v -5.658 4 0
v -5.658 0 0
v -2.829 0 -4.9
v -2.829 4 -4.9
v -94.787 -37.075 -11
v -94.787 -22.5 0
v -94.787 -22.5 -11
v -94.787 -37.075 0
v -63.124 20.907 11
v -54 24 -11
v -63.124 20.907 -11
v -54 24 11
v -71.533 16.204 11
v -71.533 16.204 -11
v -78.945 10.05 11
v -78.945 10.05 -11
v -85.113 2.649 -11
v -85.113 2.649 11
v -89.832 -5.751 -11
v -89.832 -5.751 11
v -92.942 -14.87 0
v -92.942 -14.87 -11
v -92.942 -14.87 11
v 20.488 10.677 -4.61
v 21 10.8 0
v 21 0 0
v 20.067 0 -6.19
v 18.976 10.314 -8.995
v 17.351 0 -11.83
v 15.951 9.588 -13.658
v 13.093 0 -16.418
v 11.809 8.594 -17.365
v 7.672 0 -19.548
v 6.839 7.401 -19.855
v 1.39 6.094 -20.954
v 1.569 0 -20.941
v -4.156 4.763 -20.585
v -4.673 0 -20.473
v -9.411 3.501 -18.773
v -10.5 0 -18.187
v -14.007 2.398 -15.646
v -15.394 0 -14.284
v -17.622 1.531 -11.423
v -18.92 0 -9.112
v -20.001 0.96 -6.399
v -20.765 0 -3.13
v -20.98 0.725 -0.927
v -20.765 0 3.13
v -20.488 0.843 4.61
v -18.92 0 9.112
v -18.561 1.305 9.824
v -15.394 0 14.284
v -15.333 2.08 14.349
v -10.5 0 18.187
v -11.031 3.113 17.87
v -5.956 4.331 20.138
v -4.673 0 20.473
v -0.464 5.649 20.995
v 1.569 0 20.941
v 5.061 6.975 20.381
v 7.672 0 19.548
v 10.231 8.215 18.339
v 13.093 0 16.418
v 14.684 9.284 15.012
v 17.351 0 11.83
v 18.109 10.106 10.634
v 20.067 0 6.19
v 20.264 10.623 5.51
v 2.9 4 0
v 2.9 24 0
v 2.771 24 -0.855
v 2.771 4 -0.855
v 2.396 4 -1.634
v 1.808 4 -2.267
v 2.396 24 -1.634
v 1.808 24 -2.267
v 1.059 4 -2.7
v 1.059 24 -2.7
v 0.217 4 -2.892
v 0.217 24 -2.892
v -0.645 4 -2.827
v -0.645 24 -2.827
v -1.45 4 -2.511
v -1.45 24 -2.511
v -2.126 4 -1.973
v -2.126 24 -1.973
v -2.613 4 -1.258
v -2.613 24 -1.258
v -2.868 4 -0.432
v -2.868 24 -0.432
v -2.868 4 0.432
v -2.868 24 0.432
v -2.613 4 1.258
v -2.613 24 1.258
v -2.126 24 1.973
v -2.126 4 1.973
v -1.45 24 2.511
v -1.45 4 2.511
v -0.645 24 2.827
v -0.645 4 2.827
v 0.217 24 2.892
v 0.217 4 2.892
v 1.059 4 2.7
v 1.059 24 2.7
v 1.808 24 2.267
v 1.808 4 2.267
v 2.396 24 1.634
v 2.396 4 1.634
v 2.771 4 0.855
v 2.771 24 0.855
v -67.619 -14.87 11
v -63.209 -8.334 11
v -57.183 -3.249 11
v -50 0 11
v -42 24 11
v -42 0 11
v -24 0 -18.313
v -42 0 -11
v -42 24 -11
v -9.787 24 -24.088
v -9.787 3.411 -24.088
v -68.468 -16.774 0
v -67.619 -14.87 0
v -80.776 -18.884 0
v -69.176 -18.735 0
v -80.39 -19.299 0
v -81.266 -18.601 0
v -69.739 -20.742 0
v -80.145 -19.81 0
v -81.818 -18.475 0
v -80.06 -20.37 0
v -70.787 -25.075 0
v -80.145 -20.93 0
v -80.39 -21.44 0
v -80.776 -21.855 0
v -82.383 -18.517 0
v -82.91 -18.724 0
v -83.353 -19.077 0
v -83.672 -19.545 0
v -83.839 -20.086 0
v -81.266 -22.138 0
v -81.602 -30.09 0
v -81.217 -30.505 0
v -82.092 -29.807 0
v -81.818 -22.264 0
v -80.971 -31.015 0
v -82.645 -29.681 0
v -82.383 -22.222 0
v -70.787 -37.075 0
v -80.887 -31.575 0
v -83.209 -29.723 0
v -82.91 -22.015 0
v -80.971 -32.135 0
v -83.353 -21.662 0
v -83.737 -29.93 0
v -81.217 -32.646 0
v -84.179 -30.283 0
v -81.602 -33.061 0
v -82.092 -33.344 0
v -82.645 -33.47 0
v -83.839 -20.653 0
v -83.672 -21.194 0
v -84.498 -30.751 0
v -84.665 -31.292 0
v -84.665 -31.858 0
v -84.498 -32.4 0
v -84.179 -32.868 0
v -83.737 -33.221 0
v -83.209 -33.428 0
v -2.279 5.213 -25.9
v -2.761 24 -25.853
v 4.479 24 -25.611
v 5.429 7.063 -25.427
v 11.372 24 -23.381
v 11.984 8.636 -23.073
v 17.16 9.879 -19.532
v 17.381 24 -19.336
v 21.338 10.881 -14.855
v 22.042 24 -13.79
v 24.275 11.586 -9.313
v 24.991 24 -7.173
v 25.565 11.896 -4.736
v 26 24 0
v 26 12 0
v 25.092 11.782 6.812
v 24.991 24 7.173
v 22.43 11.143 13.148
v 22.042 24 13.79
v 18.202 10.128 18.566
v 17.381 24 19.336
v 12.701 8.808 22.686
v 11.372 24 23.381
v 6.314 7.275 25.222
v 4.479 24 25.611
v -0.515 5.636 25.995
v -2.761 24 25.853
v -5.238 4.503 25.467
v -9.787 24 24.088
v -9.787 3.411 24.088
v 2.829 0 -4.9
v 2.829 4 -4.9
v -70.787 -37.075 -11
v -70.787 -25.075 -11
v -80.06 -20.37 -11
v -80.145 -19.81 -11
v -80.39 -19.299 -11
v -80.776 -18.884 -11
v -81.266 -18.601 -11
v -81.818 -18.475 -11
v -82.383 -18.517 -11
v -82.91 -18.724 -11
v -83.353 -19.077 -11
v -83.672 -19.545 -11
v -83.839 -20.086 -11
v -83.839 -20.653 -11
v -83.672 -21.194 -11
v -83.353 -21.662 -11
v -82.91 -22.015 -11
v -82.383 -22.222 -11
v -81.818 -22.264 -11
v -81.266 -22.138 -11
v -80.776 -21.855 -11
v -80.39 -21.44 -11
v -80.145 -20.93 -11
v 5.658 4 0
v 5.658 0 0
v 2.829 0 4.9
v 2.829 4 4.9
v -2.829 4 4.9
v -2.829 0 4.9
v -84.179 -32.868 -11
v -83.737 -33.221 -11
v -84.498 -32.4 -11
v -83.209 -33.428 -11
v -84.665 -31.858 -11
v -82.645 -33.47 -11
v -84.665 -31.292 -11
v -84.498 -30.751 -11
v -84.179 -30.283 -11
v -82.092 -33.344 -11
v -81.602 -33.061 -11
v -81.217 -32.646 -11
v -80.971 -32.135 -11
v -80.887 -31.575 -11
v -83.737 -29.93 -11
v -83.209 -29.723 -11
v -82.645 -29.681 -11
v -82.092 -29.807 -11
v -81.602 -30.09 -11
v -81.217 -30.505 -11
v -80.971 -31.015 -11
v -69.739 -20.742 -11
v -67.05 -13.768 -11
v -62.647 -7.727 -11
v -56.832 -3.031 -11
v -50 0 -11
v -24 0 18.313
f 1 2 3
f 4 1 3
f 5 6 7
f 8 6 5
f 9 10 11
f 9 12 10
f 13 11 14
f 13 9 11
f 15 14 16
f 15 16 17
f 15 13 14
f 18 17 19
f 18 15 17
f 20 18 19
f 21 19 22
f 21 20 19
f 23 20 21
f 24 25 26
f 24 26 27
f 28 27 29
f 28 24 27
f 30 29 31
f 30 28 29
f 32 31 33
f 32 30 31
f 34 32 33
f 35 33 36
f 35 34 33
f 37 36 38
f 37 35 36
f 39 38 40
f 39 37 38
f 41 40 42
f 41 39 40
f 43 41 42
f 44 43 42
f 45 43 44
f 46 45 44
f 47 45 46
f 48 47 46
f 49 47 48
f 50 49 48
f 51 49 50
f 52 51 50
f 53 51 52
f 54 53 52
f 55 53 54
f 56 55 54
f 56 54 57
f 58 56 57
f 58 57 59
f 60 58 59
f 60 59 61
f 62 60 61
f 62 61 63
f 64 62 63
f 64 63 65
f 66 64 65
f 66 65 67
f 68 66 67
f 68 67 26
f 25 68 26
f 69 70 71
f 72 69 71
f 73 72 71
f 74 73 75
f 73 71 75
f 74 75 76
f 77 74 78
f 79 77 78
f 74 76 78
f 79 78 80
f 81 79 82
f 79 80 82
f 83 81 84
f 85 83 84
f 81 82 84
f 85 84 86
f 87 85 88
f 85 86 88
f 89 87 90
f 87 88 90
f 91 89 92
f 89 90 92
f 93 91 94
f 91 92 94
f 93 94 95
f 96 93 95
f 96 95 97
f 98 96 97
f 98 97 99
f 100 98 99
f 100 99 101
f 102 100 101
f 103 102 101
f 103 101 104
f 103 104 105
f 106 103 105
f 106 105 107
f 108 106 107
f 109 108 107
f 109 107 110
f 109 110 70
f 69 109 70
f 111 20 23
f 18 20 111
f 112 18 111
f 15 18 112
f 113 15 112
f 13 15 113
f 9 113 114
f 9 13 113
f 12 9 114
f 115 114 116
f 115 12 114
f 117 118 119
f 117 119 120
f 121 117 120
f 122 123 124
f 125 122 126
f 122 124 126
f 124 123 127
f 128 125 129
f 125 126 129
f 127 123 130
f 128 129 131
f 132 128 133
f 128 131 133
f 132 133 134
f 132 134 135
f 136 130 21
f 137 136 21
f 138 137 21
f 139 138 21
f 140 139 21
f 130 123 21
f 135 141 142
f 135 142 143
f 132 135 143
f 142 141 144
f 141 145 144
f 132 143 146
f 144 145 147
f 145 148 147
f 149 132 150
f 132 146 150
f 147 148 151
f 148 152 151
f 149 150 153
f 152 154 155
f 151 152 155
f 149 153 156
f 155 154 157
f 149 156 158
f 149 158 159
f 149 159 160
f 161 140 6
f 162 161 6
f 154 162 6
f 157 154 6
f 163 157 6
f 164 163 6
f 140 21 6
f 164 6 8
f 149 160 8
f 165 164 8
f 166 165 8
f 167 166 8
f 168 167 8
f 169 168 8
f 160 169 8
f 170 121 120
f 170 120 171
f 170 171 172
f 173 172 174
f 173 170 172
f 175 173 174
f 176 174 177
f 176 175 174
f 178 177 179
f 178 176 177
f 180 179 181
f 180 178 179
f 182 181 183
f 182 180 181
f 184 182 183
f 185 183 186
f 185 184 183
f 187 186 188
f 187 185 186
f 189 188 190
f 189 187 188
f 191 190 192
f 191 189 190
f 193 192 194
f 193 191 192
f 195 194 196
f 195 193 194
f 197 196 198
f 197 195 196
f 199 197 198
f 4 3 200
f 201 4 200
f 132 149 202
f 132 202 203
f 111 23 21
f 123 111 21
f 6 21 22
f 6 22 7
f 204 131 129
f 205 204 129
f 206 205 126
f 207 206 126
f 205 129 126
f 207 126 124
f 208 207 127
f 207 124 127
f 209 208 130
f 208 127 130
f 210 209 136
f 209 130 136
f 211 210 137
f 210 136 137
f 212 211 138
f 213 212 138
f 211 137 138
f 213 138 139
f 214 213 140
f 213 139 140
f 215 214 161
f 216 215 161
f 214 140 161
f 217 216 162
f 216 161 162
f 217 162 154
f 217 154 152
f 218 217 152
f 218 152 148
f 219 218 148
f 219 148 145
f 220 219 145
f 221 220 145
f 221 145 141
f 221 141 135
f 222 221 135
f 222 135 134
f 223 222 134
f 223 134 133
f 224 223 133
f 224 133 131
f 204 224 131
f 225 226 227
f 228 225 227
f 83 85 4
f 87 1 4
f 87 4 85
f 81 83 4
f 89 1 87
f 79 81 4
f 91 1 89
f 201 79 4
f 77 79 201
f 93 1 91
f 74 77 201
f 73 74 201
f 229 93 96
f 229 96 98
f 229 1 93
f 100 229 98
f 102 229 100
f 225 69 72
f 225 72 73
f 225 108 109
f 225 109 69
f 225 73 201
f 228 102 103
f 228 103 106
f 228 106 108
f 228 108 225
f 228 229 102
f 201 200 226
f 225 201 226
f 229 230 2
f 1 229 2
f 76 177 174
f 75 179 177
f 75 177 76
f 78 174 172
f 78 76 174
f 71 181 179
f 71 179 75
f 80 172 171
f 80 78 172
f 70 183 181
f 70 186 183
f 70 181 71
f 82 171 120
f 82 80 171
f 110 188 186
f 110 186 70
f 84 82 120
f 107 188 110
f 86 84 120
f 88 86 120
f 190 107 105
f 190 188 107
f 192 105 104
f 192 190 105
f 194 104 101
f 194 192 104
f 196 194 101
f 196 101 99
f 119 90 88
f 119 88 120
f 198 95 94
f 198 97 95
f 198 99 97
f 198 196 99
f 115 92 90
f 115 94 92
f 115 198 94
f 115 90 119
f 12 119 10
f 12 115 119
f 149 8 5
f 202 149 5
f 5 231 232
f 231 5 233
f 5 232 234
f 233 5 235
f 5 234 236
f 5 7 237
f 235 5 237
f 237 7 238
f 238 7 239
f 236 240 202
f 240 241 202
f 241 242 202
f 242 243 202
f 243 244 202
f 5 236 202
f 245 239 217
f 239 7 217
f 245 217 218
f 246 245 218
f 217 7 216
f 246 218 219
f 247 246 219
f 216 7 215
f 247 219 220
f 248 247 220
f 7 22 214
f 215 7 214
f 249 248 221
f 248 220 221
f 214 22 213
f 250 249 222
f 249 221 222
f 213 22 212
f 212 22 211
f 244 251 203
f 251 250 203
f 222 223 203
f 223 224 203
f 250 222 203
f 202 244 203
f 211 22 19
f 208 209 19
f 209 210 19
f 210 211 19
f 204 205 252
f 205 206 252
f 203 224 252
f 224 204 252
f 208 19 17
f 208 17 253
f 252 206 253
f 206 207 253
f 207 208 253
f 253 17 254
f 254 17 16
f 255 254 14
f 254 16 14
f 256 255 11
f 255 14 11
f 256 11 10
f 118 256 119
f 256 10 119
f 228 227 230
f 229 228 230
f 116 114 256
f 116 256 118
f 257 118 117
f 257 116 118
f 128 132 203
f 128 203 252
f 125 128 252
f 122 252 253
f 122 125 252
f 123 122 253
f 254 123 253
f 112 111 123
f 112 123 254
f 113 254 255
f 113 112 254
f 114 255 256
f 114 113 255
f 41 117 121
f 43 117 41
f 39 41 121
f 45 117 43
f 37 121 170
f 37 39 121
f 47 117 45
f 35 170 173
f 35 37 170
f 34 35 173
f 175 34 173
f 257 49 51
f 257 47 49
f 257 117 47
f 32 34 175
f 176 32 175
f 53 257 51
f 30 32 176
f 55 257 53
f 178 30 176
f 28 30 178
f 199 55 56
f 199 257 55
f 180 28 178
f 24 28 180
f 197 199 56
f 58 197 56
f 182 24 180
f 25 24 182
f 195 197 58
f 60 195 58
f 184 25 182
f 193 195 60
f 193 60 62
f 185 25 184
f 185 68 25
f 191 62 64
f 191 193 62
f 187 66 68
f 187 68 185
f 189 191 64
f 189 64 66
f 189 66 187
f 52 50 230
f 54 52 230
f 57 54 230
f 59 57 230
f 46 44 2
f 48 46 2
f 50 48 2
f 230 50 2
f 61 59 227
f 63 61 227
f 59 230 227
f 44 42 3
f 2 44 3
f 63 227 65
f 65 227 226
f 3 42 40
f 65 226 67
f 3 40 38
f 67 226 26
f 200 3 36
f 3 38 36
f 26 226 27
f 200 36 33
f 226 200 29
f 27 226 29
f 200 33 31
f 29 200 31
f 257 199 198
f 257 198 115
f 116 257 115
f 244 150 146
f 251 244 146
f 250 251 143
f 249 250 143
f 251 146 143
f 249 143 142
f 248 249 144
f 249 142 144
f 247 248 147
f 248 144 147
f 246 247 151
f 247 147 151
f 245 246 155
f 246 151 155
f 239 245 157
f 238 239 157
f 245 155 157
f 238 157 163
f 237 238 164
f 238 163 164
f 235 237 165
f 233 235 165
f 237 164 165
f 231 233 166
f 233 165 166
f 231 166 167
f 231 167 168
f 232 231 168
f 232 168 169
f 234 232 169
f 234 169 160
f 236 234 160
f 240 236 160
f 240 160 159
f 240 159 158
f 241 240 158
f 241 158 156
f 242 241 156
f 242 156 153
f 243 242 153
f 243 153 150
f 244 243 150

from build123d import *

# Parameters (mm, degrees)
BOSS_EXTRUDE1_DEPTH = 24
CUT_EXTRUDE1_DEPTH  = 29.5
SKETCH3_R           = 21
BOSS_EXTRUDE2_DEPTH = 24
CUT_EXTRUDE2_DEPTH  = 4
BOSS_EXTRUDE3_DEPTH = 11
SKETCH6_W           = 89
SKETCH6_H           = 21.5
SKETCH7_W           = 48
SKETCH7_H           = 22
BOSS_EXTRUDE4_DEPTH = 3.027047
SKETCH8_R           = 18.5
CUT_EXTRUDE3_DEPTH  = 83
CUT_EXTRUDE4_REACH  = 91
SKETCH9_R           = 1.6
SKETCH9_R_2         = 6.1
CUT_EXTRUDE5_REACH  = 125.5
SKETCH10_R          = 2.9
CUT_EXTRUDE6_REACH  = 136
SKETCH13_R          = 1.9
CUT_EXTRUDE7_DEPTH  = 27


with BuildPart() as part:
    # Sketch1 → Boss-Extrude1 (new body)
    with BuildSketch(Plane(origin=(0, 0, 0), x_dir=(1, 0, 0), z_dir=(0, 1, 0))):
        with BuildLine():
            Line((-42, 0), (-42, 11))
            Line((-42, 11), (-9.786517927, 24.087840644))
            ThreePointArc((-9.786517927, 24.087840644), (26, 0), (-9.786517927, -24.087840644))
            Line((-9.786517927, -24.087840644), (-42, -11))
            Line((-42, -11), (-42, 0))
        make_face()
    extrude(amount=BOSS_EXTRUDE1_DEPTH)

    # Sketch2 → Cut-Extrude1 (cut, symmetric)
    with BuildSketch(Plane.XY):
        Polygon((-24, 0), (26, 12), (26, 0), align=None)
    extrude(amount=CUT_EXTRUDE1_DEPTH, both=True, mode=Mode.SUBTRACT)

    # Sketch3 → Boss-Extrude2 (add)
    with BuildSketch(Plane(origin=(0, 24, 0), x_dir=(1, 0, 0), z_dir=(0, 1, 0))):
        Circle(SKETCH3_R)
    extrude(amount=-BOSS_EXTRUDE2_DEPTH)

    # Sketch4 → Cut-Extrude2 (cut)
    with BuildSketch(Plane.XZ):
        Polygon((2.829016319, 4.9), (-2.829016319, 4.9), (-5.658032638, 0), (-2.829016319, -4.9), (2.829016319, -4.9), (5.658032638, 0), align=None)
    extrude(amount=-CUT_EXTRUDE2_DEPTH, mode=Mode.SUBTRACT)

    # Sketch5 → Boss-Extrude3 (add, symmetric)
    with BuildSketch(Plane.XY):
        with BuildLine():
            ThreePointArc((-54, 24), (-78.945219608, 10.049710337), (-92.941825352, -14.869551102))
            Line((-92.941825352, -14.869551102), (-94.786517927, -22.5))
            Line((-94.786517927, -22.5), (-94.786517927, -37.075307894))
            Line((-94.786517927, -37.075307894), (-93.178015205, -46.5))
            Line((-93.178015205, -46.5), (-90, -56.5))
            Line((-90, -56.5), (-42, -56.5))
            Line((-42, -56.5), (-63.178015205, -46.5))
            Line((-63.178015205, -46.5), (-70.786517927, -37.075307894))
            Line((-70.786517927, -37.075307894), (-70.786517927, -25.075307894))
            Line((-70.786517927, -25.075307894), (-69.738862808, -20.741751748))
            ThreePointArc((-69.738862808, -20.741751748), (-62.647337683, -7.727284744), (-50, 0))
            Line((-50, 0), (-42, 0))
            Line((-42, 0), (-42, 24))
            Line((-42, 24), (-54, 24))
        make_face()
    extrude(amount=BOSS_EXTRUDE3_DEPTH, both=True)



with BuildPart() as body_2:
    # Sketch6 → Revolve1 (revolve)
    with BuildSketch(Plane.XY):
        with Locations((-53.5, -88.75)):
            Rectangle(SKETCH6_W, SKETCH6_H)
    revolve(axis=Axis((-98, -78, 0), (1, 0, 0)))


with BuildPart() as part_1:
    add(part.part)

    add(body_2.part)  # Boss-Extrude4 merges body 2
    # Sketch7 → Boss-Extrude4 (add)
    with BuildSketch(Plane.XZ.offset(56.5)):
        with Locations((-66, 0)):
            Rectangle(SKETCH7_W, SKETCH7_H)
    extrude(amount=BOSS_EXTRUDE4_DEPTH)

    # Sketch8 → Cut-Extrude3 (cut)
    with BuildSketch(Plane.ZY.offset(98)):
        with Locations((0, -78)):
            Circle(SKETCH8_R)
    extrude(amount=-CUT_EXTRUDE3_DEPTH, mode=Mode.SUBTRACT)

    # Sketch9 → Cut-Extrude4 (cut, up to next)
    with BuildSketch(Plane(origin=(-9, 0, 0), x_dir=(0, 0, -1), z_dir=(1, 0, 0)), mode=Mode.PRIVATE) as cut_extrude4_sk1:
        with Locations((15.5, -78)):
            Circle(SKETCH9_R)
    cut_extrude4_tool1 = extrude(cut_extrude4_sk1.sketch, amount=-CUT_EXTRUDE4_REACH, mode=Mode.PRIVATE) & part_1.part
    add(cut_extrude4_tool1.solids().sort_by_distance((-9, -78, -15.5))[0], mode=Mode.SUBTRACT)
    # Sketch9 → Cut-Extrude4 (cut, up to next)
    with BuildSketch(Plane(origin=(-9, 0, 0), x_dir=(0, 0, -1), z_dir=(1, 0, 0)), mode=Mode.PRIVATE) as cut_extrude4_sk2:
        with Locations((7.75, -91.423393759)):
            Circle(SKETCH9_R)
    cut_extrude4_tool2 = extrude(cut_extrude4_sk2.sketch, amount=-CUT_EXTRUDE4_REACH, mode=Mode.PRIVATE) & part_1.part
    add(cut_extrude4_tool2.solids().sort_by_distance((-9, -91.423394, -7.75))[0], mode=Mode.SUBTRACT)
    # Sketch9 → Cut-Extrude4 (cut, up to next)
    with BuildSketch(Plane(origin=(-9, 0, 0), x_dir=(0, 0, -1), z_dir=(1, 0, 0)), mode=Mode.PRIVATE) as cut_extrude4_sk3:
        with Locations((-7.75, -91.423393759)):
            Circle(SKETCH9_R)
    cut_extrude4_tool3 = extrude(cut_extrude4_sk3.sketch, amount=-CUT_EXTRUDE4_REACH, mode=Mode.PRIVATE) & part_1.part
    add(cut_extrude4_tool3.solids().sort_by_distance((-9, -91.423394, 7.75))[0], mode=Mode.SUBTRACT)
    # Sketch9 → Cut-Extrude4 (cut, up to next)
    with BuildSketch(Plane(origin=(-9, 0, 0), x_dir=(0, 0, -1), z_dir=(1, 0, 0)), mode=Mode.PRIVATE) as cut_extrude4_sk4:
        with Locations((-15.5, -78)):
            Circle(SKETCH9_R)
    cut_extrude4_tool4 = extrude(cut_extrude4_sk4.sketch, amount=-CUT_EXTRUDE4_REACH, mode=Mode.PRIVATE) & part_1.part
    add(cut_extrude4_tool4.solids().sort_by_distance((-9, -78, 15.5))[0], mode=Mode.SUBTRACT)
    # Sketch9 → Cut-Extrude4 (cut, up to next)
    with BuildSketch(Plane(origin=(-9, 0, 0), x_dir=(0, 0, -1), z_dir=(1, 0, 0)), mode=Mode.PRIVATE) as cut_extrude4_sk5:
        with Locations((-7.75, -64.576606241)):
            Circle(SKETCH9_R)
    cut_extrude4_tool5 = extrude(cut_extrude4_sk5.sketch, amount=-CUT_EXTRUDE4_REACH, mode=Mode.PRIVATE) & part_1.part
    add(cut_extrude4_tool5.solids().sort_by_distance((-9, -64.576606, 7.75))[0], mode=Mode.SUBTRACT)
    # Sketch9 → Cut-Extrude4 (cut, up to next)
    with BuildSketch(Plane(origin=(-9, 0, 0), x_dir=(0, 0, -1), z_dir=(1, 0, 0)), mode=Mode.PRIVATE) as cut_extrude4_sk6:
        with Locations((7.75, -64.576606241)):
            Circle(SKETCH9_R)
    cut_extrude4_tool6 = extrude(cut_extrude4_sk6.sketch, amount=-CUT_EXTRUDE4_REACH, mode=Mode.PRIVATE) & part_1.part
    add(cut_extrude4_tool6.solids().sort_by_distance((-9, -64.576606, -7.75))[0], mode=Mode.SUBTRACT)
    # Sketch9 → Cut-Extrude4 (cut, up to next)
    with BuildSketch(Plane(origin=(-9, 0, 0), x_dir=(0, 0, -1), z_dir=(1, 0, 0)), mode=Mode.PRIVATE) as cut_extrude4_sk7:
        with Locations((0, -85)):
            Circle(SKETCH9_R_2)
    cut_extrude4_tool7 = extrude(cut_extrude4_sk7.sketch, amount=-CUT_EXTRUDE4_REACH, mode=Mode.PRIVATE) & part_1.part
    add(cut_extrude4_tool7.solids().sort_by_distance((-9, -85, 0))[0], mode=Mode.SUBTRACT)

    # Sketch10 → Cut-Extrude5 (cut, up to next)
    with BuildSketch(Plane(origin=(0, 24, 0), x_dir=(1, 0, 0), z_dir=(0, 1, 0)), mode=Mode.PRIVATE) as cut_extrude5_sk1:
        Circle(SKETCH10_R)
    cut_extrude5_tool1 = extrude(cut_extrude5_sk1.sketch, amount=-CUT_EXTRUDE5_REACH, mode=Mode.PRIVATE) & part_1.part
    add(cut_extrude5_tool1.solids().sort_by_distance((0, 24, 0))[0], mode=Mode.SUBTRACT)

    # Sketch12 → Cut-Extrude6 (cut, up to next)
    with BuildSketch(Plane.ZY.offset(108), mode=Mode.PRIVATE) as cut_extrude6_sk1:
        Polygon((0, -14.869551102), (0, -37.075307894), (-35.009935155, -37.075307894), (-35.009935155, -113.334550455), (34.515095082, -113.334550455), (34.515095082, -14.869551102), align=None)
    cut_extrude6_tool1 = extrude(cut_extrude6_sk1.sketch, amount=-CUT_EXTRUDE6_REACH, mode=Mode.PRIVATE) & part_1.part
    add(cut_extrude6_tool1.solids().sort_by_distance((-108, -68.986865, 1.963457))[0], mode=Mode.SUBTRACT)

    # Sketch13 → Cut-Extrude7 (cut, through all)
    with BuildSketch(Plane.XY):
        with Locations((-81.960177429, -20.369551102)):
            Circle(SKETCH13_R)
        with Locations((-82.786517927, -31.575307894)):
            Circle(SKETCH13_R)
    extrude(amount=-CUT_EXTRUDE7_DEPTH, mode=Mode.SUBTRACT)


solid = part_1.part
